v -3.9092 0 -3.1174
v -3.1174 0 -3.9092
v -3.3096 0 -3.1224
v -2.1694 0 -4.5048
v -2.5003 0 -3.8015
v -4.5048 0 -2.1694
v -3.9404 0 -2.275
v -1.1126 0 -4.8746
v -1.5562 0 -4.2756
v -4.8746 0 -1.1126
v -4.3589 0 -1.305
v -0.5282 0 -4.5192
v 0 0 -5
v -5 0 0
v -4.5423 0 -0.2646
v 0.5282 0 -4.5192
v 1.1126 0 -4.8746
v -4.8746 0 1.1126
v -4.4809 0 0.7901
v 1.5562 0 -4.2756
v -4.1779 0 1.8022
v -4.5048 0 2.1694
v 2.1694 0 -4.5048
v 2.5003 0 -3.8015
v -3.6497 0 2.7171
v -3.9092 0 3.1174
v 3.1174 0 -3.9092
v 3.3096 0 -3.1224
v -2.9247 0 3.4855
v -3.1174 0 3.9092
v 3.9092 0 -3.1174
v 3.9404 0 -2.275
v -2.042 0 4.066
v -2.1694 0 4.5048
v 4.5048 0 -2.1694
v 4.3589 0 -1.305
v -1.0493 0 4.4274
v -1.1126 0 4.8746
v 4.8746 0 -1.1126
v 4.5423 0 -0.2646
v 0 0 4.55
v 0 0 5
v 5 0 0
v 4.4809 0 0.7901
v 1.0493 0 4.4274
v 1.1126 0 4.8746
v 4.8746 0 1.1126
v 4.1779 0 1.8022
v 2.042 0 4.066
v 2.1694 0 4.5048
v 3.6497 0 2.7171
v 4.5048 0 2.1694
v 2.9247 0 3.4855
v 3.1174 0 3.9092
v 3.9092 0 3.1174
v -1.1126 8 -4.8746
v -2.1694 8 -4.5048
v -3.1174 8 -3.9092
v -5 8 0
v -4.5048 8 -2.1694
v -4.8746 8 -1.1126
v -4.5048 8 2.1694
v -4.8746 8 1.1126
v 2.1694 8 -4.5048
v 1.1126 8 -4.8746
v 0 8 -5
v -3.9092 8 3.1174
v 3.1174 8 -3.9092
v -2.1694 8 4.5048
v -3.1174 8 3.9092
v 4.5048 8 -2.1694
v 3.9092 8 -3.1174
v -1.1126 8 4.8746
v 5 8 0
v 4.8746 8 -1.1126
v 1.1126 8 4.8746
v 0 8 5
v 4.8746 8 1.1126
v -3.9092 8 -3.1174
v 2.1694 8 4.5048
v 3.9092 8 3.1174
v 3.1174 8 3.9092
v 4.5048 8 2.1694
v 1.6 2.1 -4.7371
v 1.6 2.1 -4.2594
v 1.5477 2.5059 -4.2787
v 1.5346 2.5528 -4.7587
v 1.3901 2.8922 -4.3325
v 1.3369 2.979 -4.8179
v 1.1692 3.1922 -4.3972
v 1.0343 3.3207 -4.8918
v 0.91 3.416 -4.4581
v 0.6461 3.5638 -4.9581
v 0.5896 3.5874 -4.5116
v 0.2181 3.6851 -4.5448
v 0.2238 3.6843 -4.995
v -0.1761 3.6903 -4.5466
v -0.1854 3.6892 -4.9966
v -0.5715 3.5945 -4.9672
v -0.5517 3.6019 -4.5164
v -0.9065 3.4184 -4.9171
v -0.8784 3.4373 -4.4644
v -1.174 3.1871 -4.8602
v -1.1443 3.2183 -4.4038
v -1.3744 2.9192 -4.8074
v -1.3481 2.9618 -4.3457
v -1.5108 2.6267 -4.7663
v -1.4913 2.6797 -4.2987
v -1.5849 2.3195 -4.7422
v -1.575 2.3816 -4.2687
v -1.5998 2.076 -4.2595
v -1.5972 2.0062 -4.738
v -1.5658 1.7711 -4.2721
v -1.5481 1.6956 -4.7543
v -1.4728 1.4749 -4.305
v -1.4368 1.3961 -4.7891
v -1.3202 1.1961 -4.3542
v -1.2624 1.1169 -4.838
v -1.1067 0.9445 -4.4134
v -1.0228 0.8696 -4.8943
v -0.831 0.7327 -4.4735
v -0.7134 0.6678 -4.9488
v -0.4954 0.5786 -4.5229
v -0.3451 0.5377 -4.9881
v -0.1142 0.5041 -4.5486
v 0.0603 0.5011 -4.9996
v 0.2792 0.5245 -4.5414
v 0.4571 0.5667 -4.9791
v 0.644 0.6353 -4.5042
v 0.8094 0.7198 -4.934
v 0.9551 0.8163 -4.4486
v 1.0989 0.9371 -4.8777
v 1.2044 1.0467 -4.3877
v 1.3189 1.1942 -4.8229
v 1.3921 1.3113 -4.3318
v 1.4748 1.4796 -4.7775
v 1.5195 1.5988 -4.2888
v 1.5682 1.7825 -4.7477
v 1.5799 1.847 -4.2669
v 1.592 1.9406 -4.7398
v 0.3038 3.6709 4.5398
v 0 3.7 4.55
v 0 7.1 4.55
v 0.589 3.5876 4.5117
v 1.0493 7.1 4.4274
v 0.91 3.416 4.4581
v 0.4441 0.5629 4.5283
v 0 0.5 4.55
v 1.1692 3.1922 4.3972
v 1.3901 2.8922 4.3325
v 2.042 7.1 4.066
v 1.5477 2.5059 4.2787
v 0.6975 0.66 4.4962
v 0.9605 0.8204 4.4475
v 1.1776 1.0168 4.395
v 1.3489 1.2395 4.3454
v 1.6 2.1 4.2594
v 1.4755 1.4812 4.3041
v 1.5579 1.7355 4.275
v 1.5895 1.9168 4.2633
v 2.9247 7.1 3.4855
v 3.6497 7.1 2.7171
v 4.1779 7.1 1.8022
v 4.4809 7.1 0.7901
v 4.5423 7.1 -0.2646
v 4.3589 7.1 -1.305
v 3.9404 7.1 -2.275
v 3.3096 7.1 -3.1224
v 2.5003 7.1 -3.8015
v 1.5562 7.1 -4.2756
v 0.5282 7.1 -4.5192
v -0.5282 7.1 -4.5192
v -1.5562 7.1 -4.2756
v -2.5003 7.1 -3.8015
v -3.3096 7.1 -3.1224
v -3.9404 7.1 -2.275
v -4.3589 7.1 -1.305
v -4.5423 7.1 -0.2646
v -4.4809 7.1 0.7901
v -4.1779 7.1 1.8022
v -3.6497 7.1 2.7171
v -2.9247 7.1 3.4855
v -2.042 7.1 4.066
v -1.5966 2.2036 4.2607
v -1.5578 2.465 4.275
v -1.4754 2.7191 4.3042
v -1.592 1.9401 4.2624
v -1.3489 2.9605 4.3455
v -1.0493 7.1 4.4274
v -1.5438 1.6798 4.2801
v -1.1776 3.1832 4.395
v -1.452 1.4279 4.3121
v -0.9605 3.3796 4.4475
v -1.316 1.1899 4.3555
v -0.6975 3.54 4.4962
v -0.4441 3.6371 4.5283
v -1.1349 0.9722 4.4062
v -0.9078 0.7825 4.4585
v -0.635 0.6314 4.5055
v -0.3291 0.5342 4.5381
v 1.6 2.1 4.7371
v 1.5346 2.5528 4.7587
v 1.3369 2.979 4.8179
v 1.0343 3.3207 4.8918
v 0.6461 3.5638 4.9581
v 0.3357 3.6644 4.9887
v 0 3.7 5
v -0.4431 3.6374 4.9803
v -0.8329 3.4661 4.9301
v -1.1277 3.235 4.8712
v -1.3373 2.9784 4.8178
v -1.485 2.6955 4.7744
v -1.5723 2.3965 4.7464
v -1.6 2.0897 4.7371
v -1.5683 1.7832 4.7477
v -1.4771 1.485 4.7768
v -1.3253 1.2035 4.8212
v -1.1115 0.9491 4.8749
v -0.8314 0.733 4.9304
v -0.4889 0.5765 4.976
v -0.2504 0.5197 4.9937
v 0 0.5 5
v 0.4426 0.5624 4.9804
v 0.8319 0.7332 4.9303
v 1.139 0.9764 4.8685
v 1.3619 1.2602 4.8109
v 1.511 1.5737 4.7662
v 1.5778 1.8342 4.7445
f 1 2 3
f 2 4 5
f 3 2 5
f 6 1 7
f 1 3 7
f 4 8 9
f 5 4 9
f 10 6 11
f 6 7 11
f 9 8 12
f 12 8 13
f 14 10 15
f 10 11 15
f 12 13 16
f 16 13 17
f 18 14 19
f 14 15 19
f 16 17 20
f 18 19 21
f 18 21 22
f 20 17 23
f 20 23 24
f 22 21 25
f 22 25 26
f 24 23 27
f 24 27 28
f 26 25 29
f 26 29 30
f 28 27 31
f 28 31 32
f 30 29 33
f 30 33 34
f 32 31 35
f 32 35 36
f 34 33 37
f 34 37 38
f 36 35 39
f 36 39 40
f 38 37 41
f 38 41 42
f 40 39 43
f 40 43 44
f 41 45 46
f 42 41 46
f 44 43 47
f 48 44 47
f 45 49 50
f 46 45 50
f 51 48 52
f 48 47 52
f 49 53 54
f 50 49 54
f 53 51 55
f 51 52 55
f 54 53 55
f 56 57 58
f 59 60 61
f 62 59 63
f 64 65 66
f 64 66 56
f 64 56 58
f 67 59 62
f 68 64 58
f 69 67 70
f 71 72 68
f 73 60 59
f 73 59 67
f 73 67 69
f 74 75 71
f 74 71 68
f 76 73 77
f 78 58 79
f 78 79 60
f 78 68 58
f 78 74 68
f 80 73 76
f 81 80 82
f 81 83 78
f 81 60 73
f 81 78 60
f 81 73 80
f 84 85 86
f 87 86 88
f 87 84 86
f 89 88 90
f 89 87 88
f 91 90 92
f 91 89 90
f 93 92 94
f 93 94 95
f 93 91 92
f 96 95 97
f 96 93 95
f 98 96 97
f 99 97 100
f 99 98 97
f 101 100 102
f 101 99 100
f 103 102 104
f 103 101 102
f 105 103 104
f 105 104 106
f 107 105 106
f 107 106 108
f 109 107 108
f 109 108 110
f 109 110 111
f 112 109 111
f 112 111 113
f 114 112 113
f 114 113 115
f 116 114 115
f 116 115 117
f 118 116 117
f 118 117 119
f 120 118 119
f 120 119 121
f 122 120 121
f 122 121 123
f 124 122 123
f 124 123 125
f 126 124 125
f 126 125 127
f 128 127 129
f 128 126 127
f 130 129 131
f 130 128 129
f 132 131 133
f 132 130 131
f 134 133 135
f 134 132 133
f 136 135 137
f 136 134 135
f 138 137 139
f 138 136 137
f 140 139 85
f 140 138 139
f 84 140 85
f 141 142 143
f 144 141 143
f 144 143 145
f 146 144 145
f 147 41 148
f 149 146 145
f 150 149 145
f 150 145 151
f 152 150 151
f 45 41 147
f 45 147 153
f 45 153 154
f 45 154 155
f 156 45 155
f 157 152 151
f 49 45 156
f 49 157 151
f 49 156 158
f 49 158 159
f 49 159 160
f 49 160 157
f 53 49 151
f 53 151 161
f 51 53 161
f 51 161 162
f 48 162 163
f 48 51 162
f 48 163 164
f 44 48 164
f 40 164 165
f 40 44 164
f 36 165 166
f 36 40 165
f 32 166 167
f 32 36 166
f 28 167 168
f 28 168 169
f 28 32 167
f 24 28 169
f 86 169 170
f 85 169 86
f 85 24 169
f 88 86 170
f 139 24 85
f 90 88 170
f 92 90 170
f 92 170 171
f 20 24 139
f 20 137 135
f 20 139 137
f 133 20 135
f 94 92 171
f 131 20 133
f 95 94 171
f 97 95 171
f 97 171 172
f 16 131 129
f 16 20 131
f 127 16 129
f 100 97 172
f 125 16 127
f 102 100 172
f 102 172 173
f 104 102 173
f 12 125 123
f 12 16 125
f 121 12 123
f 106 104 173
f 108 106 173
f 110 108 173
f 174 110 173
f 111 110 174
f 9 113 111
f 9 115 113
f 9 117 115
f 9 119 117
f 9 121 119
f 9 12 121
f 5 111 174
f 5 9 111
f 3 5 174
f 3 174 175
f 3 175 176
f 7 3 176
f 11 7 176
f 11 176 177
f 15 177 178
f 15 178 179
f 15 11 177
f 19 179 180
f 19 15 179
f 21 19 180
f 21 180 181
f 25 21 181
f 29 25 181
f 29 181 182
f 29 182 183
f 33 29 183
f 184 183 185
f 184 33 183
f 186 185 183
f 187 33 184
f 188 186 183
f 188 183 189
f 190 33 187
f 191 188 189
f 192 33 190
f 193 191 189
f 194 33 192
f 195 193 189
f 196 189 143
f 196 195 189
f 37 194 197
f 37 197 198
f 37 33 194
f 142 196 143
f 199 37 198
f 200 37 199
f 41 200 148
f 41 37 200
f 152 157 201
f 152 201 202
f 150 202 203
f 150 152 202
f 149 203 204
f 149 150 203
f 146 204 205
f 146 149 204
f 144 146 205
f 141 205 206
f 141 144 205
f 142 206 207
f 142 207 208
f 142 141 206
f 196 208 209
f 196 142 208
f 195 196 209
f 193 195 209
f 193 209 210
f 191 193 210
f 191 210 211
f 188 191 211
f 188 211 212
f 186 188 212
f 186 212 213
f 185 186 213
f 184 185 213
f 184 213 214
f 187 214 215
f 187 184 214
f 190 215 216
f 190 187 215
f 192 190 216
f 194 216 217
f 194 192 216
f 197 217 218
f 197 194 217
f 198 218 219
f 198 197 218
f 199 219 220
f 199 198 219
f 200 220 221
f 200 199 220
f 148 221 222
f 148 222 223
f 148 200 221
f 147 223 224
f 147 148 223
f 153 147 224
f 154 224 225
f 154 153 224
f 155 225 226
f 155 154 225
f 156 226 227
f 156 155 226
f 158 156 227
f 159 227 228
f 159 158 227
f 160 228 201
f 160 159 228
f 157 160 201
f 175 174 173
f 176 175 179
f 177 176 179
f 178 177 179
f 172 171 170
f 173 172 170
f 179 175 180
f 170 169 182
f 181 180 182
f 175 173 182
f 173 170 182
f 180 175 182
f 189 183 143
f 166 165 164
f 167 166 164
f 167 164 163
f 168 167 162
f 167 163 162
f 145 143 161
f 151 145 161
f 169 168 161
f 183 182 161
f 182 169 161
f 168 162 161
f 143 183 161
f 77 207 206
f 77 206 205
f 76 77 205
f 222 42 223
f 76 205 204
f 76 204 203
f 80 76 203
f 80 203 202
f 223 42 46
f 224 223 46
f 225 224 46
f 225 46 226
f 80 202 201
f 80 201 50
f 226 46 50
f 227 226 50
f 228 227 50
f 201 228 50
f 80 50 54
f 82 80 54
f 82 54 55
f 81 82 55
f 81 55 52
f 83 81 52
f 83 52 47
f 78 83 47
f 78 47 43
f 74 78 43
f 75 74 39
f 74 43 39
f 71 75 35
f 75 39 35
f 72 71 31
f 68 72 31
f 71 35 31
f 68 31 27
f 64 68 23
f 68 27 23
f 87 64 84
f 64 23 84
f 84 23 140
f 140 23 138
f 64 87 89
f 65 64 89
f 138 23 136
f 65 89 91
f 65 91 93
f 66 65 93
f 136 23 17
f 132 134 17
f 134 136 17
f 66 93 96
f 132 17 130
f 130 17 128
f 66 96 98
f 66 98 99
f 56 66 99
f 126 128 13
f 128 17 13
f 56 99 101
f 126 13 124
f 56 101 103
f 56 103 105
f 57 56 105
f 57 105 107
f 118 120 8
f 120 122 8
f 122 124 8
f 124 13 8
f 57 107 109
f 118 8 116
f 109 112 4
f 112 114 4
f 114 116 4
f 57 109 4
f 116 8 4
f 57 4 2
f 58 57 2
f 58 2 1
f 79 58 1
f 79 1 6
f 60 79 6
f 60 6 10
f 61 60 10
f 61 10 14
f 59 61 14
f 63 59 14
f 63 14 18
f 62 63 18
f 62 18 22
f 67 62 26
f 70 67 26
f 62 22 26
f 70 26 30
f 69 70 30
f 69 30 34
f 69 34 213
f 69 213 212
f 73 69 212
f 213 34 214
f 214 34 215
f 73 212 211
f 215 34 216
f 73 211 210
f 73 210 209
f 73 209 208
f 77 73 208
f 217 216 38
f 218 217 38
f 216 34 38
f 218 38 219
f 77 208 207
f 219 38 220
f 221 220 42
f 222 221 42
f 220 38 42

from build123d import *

# Parameters (mm, degrees)
SKETCH2_R               = 5
BOSS_EXTRUDE1_DEPTH     = 8
SKETCH4_R               = 4.55
CUT_EXTRUDE1_DEPTH      = 7.1
CUT_EXTRUDE2_DEPTH      = 11.677078252
CUT_EXTRUDE2_DEPTH_BACK = 11.677078252
SKETCH11_R              = 1.6


with BuildPart() as part:
    # Sketch2 → Boss-Extrude1 (new body)
    with BuildSketch(Plane(origin=(0, 0, 0), x_dir=(1, 0, 0), z_dir=(0, 1, 0))):
        with Locations(Location((0, 0, 0), (0, 0, 270))):
            Circle(SKETCH2_R)
    extrude(amount=BOSS_EXTRUDE1_DEPTH)

    # Sketch4 → Cut-Extrude1 (cut)
    with BuildSketch(Plane(origin=(0, 0, 0), x_dir=(1, 0, 0), z_dir=(0, 1, 0))):
        with Locations(Location((0, 0, 0), (0, 0, 270))):
            Circle(SKETCH4_R)
    extrude(amount=CUT_EXTRUDE1_DEPTH, mode=Mode.SUBTRACT)

    # Sketch11 → Cut-Extrude2 (cut, two sides: drawn at the far end of the back side and taken through both)
    with BuildSketch(Plane.XY.offset(-CUT_EXTRUDE2_DEPTH_BACK)):
        with Locations((0, 2.1)):
            Circle(SKETCH11_R)
    extrude(amount=CUT_EXTRUDE2_DEPTH + CUT_EXTRUDE2_DEPTH_BACK, mode=Mode.SUBTRACT)


solid = part.part
